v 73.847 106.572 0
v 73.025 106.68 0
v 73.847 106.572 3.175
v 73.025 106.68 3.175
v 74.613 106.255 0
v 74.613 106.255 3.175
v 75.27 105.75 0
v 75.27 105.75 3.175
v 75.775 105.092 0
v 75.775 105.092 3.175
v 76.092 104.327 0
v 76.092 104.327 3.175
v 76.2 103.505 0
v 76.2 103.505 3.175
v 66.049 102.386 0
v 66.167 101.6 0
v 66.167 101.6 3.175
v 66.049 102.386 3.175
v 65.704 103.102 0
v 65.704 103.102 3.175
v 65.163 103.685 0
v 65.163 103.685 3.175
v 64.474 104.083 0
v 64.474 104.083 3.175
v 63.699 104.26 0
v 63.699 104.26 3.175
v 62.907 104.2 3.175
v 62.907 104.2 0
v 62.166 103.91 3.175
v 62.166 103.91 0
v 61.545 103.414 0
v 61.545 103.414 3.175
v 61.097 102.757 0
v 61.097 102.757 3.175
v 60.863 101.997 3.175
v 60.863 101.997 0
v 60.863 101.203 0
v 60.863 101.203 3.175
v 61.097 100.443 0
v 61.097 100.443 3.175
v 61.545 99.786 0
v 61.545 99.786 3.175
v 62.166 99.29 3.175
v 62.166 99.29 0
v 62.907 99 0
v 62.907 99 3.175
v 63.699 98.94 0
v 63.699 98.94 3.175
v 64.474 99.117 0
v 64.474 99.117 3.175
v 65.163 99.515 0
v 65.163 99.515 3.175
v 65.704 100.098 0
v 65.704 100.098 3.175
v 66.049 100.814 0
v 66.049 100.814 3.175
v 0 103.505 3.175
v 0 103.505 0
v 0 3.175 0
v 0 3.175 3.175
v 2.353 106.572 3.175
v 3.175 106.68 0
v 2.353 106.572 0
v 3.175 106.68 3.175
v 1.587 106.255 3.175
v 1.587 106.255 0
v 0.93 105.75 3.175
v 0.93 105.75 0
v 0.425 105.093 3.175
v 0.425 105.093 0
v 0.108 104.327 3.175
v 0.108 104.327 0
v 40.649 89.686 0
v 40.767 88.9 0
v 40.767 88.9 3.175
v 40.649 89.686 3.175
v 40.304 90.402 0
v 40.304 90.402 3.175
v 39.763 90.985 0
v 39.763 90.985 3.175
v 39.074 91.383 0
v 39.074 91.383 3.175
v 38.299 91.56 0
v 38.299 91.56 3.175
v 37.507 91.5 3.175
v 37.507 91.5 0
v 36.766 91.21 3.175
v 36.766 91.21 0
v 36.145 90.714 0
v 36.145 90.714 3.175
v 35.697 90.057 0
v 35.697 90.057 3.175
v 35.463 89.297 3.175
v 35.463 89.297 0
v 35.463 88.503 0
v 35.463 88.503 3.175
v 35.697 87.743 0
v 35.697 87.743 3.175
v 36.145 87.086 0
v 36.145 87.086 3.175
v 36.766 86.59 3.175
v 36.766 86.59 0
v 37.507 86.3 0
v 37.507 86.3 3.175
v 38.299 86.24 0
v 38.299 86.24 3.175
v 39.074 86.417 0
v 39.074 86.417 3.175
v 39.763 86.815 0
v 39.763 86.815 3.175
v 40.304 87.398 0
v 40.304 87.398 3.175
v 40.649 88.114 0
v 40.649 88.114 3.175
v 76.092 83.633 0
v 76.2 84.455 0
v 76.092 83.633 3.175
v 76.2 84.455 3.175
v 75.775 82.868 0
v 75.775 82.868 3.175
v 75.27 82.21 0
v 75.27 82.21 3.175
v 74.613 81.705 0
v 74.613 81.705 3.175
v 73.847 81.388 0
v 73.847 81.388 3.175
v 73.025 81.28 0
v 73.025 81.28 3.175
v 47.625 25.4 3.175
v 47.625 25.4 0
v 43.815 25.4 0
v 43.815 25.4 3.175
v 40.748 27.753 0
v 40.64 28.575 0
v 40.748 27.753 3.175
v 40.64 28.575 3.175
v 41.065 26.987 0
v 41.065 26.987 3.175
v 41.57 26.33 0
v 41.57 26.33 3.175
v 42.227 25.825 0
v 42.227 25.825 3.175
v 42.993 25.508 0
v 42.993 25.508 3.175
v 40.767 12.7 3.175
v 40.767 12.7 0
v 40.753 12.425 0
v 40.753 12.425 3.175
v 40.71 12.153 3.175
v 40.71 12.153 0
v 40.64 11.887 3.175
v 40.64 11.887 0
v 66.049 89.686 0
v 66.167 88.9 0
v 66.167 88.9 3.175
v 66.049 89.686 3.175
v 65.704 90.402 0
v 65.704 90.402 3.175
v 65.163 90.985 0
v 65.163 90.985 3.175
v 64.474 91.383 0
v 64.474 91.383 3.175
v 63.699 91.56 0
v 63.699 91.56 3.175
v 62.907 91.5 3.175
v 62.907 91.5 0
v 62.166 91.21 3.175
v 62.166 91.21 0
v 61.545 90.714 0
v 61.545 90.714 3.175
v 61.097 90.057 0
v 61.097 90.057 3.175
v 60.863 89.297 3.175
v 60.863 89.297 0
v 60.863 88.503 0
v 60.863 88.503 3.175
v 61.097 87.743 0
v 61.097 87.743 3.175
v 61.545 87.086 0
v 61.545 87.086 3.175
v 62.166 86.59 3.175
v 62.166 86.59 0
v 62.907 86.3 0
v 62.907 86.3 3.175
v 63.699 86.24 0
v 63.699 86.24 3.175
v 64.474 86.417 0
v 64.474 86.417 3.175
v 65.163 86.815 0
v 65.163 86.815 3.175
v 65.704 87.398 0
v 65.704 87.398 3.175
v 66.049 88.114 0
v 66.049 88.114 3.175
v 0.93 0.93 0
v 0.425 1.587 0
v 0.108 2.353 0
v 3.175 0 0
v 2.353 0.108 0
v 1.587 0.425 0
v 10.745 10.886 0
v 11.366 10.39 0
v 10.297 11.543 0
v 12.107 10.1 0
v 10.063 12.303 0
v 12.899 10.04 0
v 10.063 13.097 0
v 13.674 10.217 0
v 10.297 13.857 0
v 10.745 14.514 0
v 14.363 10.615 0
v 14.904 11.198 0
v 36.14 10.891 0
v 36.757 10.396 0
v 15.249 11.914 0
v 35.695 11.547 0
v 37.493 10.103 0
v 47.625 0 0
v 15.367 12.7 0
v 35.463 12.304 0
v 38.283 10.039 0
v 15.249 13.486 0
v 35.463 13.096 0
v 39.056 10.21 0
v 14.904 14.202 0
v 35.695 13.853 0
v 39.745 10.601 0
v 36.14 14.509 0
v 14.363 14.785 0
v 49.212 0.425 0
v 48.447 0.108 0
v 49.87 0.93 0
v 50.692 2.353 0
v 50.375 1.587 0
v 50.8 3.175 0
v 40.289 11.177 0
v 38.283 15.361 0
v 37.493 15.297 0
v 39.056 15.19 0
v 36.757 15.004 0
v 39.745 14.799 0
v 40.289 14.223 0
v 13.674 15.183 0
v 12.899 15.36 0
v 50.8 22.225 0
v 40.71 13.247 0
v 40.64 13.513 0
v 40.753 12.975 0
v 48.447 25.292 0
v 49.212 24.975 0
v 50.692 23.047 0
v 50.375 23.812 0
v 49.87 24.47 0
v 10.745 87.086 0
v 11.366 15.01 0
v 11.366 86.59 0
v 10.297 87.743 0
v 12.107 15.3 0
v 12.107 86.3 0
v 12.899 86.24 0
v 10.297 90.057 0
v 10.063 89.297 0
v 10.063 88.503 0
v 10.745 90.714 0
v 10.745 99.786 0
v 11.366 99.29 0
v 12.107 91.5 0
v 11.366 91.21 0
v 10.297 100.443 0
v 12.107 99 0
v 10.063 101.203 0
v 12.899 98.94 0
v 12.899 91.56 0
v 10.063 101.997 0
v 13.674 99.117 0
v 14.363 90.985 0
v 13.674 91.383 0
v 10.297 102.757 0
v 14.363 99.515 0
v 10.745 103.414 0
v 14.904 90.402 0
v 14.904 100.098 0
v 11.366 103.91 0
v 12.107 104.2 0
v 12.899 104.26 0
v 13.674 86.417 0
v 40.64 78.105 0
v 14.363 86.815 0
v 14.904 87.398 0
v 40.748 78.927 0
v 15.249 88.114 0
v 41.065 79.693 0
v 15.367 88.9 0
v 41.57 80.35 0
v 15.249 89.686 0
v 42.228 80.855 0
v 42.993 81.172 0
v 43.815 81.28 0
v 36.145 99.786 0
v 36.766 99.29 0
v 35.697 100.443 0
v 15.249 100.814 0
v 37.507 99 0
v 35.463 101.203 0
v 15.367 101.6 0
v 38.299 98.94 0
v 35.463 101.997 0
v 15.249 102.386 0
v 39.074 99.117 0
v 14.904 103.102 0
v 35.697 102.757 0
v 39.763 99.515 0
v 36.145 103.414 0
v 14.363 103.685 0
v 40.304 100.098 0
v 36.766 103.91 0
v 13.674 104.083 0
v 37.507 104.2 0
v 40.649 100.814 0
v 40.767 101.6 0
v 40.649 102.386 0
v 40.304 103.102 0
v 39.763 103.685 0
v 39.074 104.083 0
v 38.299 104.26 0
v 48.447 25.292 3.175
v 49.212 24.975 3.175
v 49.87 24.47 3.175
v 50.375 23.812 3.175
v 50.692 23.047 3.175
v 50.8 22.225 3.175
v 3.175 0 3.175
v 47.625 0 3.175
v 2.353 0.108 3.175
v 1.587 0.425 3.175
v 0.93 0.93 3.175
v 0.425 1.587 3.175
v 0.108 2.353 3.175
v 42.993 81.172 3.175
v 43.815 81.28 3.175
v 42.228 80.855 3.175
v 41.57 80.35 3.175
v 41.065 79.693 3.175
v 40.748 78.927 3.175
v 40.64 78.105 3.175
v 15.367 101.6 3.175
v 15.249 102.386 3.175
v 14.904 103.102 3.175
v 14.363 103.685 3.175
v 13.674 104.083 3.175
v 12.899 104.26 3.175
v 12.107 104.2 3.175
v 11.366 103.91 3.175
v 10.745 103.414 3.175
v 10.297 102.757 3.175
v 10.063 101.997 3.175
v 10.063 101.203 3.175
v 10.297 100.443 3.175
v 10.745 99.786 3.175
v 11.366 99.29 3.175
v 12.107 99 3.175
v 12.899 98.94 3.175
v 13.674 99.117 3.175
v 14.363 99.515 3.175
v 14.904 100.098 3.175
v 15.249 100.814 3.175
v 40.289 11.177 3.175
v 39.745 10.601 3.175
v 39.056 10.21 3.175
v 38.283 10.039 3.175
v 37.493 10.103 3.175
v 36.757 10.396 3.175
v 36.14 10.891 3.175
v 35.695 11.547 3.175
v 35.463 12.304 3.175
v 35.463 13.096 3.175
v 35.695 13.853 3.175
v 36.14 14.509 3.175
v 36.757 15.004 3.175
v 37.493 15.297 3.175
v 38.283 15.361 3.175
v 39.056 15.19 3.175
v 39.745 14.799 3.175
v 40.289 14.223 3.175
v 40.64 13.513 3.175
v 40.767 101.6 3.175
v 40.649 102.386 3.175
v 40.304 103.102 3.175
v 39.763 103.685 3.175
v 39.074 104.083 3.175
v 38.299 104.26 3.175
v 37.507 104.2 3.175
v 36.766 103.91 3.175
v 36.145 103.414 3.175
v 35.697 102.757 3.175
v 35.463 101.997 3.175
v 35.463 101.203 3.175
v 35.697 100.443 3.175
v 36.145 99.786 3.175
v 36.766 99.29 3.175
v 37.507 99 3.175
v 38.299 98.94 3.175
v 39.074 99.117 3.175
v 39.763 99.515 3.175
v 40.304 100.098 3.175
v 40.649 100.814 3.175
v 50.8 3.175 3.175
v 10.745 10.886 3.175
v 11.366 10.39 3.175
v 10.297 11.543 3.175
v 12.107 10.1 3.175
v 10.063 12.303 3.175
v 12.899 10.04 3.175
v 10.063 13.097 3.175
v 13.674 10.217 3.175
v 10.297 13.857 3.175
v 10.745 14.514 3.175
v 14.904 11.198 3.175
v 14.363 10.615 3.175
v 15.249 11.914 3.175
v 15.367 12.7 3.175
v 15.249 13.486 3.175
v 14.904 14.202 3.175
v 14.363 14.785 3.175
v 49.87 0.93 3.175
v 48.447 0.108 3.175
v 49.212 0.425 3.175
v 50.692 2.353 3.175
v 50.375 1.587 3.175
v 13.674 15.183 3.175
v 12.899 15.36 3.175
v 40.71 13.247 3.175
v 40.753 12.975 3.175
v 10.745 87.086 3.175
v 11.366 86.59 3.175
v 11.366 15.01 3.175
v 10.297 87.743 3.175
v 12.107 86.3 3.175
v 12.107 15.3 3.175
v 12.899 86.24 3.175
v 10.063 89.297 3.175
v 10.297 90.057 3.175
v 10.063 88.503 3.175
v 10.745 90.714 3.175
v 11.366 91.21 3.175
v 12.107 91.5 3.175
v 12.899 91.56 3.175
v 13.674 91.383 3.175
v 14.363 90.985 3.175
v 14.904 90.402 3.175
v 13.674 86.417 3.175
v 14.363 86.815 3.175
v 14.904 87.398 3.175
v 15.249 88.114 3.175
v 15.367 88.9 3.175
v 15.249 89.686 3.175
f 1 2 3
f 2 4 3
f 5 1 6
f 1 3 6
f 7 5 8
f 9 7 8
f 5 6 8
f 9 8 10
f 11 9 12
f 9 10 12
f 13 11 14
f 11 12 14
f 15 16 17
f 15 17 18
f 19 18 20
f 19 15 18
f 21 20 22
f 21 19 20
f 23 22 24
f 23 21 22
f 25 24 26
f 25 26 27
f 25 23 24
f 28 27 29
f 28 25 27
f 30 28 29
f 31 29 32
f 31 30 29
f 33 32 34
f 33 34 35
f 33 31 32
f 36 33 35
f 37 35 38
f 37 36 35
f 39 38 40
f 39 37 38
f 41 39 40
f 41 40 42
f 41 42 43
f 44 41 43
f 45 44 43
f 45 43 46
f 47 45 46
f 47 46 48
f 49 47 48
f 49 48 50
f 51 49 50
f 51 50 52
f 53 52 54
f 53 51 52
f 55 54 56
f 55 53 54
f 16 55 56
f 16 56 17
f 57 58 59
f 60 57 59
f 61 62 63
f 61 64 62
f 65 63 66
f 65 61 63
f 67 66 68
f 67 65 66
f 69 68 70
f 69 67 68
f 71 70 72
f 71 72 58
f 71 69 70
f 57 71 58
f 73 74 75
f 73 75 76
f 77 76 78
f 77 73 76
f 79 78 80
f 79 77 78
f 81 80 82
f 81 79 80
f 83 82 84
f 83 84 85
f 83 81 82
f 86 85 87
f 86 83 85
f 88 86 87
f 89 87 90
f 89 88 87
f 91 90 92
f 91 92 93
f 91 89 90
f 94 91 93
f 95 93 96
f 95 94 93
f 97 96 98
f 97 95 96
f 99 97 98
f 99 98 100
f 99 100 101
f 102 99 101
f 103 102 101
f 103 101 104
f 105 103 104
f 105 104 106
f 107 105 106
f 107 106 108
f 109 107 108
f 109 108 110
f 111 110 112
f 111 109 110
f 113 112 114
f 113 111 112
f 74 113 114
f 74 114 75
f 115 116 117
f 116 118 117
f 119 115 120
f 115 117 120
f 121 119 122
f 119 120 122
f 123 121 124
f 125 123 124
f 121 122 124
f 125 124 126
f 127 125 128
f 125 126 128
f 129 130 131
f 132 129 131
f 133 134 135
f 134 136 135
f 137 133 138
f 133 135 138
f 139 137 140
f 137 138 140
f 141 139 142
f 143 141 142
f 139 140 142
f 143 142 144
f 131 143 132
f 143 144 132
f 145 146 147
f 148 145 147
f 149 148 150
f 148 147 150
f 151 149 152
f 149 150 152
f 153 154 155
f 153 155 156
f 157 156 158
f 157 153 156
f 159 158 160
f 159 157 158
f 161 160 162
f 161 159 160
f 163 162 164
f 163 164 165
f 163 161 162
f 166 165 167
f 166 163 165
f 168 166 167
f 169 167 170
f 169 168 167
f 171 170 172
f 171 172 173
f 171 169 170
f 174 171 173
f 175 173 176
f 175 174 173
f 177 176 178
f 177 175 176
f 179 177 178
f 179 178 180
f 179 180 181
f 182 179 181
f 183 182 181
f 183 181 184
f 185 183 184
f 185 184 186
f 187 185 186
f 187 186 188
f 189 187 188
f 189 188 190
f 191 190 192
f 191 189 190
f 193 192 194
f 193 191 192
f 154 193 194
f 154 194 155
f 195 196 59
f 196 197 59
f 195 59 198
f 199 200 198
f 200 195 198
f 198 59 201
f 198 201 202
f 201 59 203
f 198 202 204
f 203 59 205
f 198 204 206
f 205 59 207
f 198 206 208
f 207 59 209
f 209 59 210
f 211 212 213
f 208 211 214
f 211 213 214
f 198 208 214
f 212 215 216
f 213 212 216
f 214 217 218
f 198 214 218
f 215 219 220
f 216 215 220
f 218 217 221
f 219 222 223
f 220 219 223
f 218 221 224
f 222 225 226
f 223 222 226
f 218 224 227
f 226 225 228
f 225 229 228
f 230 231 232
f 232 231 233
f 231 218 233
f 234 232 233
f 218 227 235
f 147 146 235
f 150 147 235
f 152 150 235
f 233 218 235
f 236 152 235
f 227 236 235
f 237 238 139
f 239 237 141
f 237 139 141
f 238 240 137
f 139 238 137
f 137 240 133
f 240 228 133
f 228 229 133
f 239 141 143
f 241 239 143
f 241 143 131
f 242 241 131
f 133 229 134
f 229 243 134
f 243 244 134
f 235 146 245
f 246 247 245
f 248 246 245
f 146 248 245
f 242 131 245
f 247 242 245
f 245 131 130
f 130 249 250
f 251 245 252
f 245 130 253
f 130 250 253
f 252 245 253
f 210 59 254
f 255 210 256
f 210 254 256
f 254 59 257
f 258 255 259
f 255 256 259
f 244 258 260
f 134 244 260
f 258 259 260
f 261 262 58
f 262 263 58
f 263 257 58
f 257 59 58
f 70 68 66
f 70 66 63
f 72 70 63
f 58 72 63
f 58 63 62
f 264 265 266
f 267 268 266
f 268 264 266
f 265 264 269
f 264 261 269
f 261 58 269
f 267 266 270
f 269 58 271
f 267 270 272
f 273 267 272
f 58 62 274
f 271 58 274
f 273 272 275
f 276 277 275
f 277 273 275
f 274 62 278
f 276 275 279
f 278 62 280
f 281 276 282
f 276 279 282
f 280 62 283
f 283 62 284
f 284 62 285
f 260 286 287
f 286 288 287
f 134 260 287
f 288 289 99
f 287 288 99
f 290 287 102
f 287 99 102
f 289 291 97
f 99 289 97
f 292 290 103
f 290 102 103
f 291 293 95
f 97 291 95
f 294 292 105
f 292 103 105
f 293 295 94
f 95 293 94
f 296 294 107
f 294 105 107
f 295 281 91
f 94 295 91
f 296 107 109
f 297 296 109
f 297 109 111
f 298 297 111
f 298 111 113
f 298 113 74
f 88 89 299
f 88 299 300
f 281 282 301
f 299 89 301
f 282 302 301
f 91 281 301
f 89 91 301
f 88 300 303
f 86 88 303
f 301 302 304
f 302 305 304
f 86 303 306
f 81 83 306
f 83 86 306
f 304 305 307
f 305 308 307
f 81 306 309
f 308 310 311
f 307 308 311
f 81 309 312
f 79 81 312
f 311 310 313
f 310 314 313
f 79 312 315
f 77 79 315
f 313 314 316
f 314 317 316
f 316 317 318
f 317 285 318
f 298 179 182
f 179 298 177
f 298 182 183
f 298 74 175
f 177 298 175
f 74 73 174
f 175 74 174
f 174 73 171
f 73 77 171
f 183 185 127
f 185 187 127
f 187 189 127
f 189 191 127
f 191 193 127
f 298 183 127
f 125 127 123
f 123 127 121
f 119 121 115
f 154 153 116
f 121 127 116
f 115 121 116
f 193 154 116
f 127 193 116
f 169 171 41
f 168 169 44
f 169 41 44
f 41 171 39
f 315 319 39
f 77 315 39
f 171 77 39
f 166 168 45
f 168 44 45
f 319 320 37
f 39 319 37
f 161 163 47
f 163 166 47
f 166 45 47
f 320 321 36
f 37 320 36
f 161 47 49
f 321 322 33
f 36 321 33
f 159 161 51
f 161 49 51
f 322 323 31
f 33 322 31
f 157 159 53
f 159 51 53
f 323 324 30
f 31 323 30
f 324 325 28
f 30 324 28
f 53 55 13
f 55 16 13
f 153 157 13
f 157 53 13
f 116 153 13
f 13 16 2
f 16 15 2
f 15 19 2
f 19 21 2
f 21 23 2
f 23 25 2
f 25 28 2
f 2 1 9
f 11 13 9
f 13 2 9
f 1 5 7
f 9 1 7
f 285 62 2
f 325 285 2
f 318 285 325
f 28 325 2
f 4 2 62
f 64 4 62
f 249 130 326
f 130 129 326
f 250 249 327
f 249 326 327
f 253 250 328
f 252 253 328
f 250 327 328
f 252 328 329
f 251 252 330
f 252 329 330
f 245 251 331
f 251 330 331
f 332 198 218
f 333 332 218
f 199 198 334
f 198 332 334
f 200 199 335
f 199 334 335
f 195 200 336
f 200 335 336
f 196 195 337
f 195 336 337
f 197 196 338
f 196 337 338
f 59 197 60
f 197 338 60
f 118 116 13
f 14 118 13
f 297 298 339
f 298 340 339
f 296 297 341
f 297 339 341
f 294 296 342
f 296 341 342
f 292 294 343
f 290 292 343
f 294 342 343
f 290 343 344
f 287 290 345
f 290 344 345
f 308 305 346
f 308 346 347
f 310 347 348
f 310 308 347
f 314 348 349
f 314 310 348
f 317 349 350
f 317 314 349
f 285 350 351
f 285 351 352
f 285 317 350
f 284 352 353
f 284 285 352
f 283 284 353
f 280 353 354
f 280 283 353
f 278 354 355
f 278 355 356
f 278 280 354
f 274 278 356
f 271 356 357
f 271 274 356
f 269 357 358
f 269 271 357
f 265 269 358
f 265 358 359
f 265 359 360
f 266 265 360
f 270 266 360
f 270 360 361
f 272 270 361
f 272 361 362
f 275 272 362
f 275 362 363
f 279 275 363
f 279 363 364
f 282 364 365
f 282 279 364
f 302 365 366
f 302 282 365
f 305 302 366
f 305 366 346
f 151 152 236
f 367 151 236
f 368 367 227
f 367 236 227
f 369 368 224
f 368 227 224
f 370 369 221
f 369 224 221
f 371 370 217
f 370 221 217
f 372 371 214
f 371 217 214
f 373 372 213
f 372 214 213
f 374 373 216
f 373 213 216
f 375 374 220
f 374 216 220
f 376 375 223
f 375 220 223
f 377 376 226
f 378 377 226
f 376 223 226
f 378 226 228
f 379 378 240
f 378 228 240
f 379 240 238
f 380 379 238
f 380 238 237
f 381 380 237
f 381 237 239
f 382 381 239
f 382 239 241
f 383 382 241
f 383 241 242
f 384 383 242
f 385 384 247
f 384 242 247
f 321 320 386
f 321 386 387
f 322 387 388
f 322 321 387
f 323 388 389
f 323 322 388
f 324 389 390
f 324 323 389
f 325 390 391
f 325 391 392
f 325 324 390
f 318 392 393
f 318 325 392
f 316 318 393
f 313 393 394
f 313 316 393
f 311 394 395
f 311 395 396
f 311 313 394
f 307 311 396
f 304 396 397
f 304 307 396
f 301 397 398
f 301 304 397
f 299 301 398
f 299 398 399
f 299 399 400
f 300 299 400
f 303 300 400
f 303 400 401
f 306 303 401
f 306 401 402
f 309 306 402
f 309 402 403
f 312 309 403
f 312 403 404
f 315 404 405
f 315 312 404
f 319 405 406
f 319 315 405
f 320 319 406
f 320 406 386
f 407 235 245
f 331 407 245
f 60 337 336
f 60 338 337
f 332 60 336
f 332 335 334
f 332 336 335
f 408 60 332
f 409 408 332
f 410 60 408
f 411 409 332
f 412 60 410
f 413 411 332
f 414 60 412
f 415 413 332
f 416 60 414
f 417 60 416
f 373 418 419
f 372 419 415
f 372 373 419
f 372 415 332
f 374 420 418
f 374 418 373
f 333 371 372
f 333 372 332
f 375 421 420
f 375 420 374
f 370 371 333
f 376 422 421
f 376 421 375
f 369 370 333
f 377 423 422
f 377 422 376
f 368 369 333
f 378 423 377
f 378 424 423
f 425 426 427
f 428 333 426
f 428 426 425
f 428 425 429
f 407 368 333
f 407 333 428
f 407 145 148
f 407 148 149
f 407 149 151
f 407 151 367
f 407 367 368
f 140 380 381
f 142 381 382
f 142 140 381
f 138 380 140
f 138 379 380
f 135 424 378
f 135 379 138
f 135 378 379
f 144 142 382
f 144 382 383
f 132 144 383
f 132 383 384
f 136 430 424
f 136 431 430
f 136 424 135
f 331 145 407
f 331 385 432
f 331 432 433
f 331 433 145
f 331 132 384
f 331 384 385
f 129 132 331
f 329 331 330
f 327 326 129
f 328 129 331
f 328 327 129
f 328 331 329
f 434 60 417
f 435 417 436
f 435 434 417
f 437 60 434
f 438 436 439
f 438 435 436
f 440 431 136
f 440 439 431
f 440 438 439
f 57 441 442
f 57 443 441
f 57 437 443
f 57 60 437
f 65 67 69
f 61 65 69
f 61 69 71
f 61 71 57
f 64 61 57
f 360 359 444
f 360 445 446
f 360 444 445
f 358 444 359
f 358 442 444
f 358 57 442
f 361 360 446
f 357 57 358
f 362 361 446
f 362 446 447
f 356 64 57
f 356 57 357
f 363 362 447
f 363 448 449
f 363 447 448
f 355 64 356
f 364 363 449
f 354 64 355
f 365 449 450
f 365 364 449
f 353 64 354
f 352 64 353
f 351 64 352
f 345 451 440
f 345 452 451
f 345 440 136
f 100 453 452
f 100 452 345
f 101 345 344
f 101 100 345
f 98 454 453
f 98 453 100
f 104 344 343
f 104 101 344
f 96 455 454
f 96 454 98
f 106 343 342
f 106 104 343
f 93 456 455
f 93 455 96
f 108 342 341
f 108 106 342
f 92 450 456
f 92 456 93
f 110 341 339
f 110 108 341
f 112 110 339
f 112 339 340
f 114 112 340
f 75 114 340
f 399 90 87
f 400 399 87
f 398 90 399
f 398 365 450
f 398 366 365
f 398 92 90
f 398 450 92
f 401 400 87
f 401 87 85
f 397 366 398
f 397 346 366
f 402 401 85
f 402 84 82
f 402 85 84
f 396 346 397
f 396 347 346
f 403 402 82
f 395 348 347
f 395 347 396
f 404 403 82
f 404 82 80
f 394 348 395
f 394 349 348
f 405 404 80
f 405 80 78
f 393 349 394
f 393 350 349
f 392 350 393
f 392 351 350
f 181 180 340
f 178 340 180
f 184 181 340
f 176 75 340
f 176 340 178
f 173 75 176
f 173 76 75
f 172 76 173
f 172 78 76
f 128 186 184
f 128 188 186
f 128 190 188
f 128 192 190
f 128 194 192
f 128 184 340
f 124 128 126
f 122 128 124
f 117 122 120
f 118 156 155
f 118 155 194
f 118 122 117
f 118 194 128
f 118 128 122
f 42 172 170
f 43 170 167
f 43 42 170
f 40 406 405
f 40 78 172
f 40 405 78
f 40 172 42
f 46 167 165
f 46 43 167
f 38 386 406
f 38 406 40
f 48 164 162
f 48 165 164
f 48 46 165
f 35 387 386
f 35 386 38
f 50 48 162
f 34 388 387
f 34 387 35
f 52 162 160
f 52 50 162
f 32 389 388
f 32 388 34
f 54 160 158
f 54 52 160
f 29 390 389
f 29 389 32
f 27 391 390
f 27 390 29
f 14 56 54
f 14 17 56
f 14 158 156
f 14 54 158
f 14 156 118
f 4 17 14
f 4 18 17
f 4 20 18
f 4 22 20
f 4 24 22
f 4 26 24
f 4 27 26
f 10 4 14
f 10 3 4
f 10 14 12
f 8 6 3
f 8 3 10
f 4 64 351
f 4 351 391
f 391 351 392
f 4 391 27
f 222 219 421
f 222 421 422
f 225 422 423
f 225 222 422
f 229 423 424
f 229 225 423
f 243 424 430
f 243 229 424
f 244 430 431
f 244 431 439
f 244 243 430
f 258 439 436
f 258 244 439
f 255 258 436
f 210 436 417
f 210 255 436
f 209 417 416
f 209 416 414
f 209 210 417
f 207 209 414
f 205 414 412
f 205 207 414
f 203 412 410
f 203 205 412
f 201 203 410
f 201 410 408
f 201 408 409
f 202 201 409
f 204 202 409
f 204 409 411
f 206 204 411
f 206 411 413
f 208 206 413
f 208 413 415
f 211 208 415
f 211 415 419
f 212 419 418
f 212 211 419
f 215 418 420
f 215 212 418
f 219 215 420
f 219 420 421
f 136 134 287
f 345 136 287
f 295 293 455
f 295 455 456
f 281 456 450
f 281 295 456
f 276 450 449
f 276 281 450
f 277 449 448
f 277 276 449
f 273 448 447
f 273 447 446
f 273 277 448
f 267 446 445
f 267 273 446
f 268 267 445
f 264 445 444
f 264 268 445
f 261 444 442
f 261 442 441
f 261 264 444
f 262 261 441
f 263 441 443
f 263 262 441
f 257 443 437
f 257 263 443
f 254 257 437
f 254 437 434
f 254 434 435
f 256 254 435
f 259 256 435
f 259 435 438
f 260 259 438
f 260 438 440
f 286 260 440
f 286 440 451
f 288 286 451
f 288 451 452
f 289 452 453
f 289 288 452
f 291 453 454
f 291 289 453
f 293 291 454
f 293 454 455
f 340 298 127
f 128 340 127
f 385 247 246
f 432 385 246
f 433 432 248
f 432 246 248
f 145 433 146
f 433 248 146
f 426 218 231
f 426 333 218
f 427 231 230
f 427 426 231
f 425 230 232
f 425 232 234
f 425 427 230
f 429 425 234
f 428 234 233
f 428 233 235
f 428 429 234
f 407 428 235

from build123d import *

# Parameters (mm, degrees)
SKETCH1_R           = 2.667
BOSS_EXTRUDE1_DEPTH = 3.175
FILLET1_R           = 3.175


with BuildPart() as part:
    # Sketch1 → Boss-Extrude1 (new body)
    # profile 1 of 2: a face of its own
    with BuildSketch(Plane.XY):
        with BuildLine():
            Line((0, 106.68), (0, 0))
            Line((0, 0), (40.64, 0))
            Line((40.64, 0), (40.64, 11.886803222))
            ThreePointArc((40.64, 11.886803222), (35.433, 12.7), (40.64, 13.513196778))
            Line((40.64, 13.513196778), (40.64, 25.4))
            Line((40.64, 25.4), (40.64, 81.28))
            Line((40.64, 81.28), (50.8, 81.28))
            Line((50.8, 81.28), (76.2, 81.28))
            Line((76.2, 81.28), (76.2, 106.68))
            Line((76.2, 106.68), (0, 106.68))
        make_face()
        with Locations((12.7, 12.7)):
            Circle(SKETCH1_R, mode=Mode.SUBTRACT)
        with Locations((12.7, 88.9)):
            Circle(SKETCH1_R, mode=Mode.SUBTRACT)
        with Locations((12.7, 101.6)):
            Circle(SKETCH1_R, mode=Mode.SUBTRACT)
        with Locations((38.1, 101.6)):
            Circle(SKETCH1_R, mode=Mode.SUBTRACT)
        with Locations((38.1, 88.9)):
            Circle(SKETCH1_R, mode=Mode.SUBTRACT)
        with Locations((63.5, 88.9)):
            Circle(SKETCH1_R, mode=Mode.SUBTRACT)
        with Locations((63.5, 101.6)):
            Circle(SKETCH1_R, mode=Mode.SUBTRACT)
    # profile 2 of 2: a face of its own
    with BuildSketch(Plane.XY):
        with BuildLine():
            Line((40.64, 11.886803222), (40.64, 0))
            Line((40.64, 0), (50.8, 0))
            Line((50.8, 0), (50.8, 25.4))
            Line((50.8, 25.4), (40.64, 25.4))
            Line((40.64, 25.4), (40.64, 13.513196778))
            ThreePointArc((40.64, 13.513196778), (40.735058728, 13.111527034), (40.767, 12.7))
            ThreePointArc((40.767, 12.7), (40.735058728, 12.288472966), (40.64, 11.886803222))
        make_face()
    extrude(amount=BOSS_EXTRUDE1_DEPTH)

    # Fillet1
    fillet1_edges = [part.edges().sort_by_distance(p)[0] for p in [
        (50.8, 25.4, 1.5875),
        (50.8, 0, 1.5875),
        (0, 0, 1.5875),
        (0, 106.68, 1.5875),
        (76.2, 106.68, 1.5875),
        (76.2, 81.28, 1.5875),
        (40.64, 81.28, 1.5875),
        (40.64, 25.4, 1.5875),
    ]]
    fillet(fillet1_edges, radius=FILLET1_R)


solid = part.part
